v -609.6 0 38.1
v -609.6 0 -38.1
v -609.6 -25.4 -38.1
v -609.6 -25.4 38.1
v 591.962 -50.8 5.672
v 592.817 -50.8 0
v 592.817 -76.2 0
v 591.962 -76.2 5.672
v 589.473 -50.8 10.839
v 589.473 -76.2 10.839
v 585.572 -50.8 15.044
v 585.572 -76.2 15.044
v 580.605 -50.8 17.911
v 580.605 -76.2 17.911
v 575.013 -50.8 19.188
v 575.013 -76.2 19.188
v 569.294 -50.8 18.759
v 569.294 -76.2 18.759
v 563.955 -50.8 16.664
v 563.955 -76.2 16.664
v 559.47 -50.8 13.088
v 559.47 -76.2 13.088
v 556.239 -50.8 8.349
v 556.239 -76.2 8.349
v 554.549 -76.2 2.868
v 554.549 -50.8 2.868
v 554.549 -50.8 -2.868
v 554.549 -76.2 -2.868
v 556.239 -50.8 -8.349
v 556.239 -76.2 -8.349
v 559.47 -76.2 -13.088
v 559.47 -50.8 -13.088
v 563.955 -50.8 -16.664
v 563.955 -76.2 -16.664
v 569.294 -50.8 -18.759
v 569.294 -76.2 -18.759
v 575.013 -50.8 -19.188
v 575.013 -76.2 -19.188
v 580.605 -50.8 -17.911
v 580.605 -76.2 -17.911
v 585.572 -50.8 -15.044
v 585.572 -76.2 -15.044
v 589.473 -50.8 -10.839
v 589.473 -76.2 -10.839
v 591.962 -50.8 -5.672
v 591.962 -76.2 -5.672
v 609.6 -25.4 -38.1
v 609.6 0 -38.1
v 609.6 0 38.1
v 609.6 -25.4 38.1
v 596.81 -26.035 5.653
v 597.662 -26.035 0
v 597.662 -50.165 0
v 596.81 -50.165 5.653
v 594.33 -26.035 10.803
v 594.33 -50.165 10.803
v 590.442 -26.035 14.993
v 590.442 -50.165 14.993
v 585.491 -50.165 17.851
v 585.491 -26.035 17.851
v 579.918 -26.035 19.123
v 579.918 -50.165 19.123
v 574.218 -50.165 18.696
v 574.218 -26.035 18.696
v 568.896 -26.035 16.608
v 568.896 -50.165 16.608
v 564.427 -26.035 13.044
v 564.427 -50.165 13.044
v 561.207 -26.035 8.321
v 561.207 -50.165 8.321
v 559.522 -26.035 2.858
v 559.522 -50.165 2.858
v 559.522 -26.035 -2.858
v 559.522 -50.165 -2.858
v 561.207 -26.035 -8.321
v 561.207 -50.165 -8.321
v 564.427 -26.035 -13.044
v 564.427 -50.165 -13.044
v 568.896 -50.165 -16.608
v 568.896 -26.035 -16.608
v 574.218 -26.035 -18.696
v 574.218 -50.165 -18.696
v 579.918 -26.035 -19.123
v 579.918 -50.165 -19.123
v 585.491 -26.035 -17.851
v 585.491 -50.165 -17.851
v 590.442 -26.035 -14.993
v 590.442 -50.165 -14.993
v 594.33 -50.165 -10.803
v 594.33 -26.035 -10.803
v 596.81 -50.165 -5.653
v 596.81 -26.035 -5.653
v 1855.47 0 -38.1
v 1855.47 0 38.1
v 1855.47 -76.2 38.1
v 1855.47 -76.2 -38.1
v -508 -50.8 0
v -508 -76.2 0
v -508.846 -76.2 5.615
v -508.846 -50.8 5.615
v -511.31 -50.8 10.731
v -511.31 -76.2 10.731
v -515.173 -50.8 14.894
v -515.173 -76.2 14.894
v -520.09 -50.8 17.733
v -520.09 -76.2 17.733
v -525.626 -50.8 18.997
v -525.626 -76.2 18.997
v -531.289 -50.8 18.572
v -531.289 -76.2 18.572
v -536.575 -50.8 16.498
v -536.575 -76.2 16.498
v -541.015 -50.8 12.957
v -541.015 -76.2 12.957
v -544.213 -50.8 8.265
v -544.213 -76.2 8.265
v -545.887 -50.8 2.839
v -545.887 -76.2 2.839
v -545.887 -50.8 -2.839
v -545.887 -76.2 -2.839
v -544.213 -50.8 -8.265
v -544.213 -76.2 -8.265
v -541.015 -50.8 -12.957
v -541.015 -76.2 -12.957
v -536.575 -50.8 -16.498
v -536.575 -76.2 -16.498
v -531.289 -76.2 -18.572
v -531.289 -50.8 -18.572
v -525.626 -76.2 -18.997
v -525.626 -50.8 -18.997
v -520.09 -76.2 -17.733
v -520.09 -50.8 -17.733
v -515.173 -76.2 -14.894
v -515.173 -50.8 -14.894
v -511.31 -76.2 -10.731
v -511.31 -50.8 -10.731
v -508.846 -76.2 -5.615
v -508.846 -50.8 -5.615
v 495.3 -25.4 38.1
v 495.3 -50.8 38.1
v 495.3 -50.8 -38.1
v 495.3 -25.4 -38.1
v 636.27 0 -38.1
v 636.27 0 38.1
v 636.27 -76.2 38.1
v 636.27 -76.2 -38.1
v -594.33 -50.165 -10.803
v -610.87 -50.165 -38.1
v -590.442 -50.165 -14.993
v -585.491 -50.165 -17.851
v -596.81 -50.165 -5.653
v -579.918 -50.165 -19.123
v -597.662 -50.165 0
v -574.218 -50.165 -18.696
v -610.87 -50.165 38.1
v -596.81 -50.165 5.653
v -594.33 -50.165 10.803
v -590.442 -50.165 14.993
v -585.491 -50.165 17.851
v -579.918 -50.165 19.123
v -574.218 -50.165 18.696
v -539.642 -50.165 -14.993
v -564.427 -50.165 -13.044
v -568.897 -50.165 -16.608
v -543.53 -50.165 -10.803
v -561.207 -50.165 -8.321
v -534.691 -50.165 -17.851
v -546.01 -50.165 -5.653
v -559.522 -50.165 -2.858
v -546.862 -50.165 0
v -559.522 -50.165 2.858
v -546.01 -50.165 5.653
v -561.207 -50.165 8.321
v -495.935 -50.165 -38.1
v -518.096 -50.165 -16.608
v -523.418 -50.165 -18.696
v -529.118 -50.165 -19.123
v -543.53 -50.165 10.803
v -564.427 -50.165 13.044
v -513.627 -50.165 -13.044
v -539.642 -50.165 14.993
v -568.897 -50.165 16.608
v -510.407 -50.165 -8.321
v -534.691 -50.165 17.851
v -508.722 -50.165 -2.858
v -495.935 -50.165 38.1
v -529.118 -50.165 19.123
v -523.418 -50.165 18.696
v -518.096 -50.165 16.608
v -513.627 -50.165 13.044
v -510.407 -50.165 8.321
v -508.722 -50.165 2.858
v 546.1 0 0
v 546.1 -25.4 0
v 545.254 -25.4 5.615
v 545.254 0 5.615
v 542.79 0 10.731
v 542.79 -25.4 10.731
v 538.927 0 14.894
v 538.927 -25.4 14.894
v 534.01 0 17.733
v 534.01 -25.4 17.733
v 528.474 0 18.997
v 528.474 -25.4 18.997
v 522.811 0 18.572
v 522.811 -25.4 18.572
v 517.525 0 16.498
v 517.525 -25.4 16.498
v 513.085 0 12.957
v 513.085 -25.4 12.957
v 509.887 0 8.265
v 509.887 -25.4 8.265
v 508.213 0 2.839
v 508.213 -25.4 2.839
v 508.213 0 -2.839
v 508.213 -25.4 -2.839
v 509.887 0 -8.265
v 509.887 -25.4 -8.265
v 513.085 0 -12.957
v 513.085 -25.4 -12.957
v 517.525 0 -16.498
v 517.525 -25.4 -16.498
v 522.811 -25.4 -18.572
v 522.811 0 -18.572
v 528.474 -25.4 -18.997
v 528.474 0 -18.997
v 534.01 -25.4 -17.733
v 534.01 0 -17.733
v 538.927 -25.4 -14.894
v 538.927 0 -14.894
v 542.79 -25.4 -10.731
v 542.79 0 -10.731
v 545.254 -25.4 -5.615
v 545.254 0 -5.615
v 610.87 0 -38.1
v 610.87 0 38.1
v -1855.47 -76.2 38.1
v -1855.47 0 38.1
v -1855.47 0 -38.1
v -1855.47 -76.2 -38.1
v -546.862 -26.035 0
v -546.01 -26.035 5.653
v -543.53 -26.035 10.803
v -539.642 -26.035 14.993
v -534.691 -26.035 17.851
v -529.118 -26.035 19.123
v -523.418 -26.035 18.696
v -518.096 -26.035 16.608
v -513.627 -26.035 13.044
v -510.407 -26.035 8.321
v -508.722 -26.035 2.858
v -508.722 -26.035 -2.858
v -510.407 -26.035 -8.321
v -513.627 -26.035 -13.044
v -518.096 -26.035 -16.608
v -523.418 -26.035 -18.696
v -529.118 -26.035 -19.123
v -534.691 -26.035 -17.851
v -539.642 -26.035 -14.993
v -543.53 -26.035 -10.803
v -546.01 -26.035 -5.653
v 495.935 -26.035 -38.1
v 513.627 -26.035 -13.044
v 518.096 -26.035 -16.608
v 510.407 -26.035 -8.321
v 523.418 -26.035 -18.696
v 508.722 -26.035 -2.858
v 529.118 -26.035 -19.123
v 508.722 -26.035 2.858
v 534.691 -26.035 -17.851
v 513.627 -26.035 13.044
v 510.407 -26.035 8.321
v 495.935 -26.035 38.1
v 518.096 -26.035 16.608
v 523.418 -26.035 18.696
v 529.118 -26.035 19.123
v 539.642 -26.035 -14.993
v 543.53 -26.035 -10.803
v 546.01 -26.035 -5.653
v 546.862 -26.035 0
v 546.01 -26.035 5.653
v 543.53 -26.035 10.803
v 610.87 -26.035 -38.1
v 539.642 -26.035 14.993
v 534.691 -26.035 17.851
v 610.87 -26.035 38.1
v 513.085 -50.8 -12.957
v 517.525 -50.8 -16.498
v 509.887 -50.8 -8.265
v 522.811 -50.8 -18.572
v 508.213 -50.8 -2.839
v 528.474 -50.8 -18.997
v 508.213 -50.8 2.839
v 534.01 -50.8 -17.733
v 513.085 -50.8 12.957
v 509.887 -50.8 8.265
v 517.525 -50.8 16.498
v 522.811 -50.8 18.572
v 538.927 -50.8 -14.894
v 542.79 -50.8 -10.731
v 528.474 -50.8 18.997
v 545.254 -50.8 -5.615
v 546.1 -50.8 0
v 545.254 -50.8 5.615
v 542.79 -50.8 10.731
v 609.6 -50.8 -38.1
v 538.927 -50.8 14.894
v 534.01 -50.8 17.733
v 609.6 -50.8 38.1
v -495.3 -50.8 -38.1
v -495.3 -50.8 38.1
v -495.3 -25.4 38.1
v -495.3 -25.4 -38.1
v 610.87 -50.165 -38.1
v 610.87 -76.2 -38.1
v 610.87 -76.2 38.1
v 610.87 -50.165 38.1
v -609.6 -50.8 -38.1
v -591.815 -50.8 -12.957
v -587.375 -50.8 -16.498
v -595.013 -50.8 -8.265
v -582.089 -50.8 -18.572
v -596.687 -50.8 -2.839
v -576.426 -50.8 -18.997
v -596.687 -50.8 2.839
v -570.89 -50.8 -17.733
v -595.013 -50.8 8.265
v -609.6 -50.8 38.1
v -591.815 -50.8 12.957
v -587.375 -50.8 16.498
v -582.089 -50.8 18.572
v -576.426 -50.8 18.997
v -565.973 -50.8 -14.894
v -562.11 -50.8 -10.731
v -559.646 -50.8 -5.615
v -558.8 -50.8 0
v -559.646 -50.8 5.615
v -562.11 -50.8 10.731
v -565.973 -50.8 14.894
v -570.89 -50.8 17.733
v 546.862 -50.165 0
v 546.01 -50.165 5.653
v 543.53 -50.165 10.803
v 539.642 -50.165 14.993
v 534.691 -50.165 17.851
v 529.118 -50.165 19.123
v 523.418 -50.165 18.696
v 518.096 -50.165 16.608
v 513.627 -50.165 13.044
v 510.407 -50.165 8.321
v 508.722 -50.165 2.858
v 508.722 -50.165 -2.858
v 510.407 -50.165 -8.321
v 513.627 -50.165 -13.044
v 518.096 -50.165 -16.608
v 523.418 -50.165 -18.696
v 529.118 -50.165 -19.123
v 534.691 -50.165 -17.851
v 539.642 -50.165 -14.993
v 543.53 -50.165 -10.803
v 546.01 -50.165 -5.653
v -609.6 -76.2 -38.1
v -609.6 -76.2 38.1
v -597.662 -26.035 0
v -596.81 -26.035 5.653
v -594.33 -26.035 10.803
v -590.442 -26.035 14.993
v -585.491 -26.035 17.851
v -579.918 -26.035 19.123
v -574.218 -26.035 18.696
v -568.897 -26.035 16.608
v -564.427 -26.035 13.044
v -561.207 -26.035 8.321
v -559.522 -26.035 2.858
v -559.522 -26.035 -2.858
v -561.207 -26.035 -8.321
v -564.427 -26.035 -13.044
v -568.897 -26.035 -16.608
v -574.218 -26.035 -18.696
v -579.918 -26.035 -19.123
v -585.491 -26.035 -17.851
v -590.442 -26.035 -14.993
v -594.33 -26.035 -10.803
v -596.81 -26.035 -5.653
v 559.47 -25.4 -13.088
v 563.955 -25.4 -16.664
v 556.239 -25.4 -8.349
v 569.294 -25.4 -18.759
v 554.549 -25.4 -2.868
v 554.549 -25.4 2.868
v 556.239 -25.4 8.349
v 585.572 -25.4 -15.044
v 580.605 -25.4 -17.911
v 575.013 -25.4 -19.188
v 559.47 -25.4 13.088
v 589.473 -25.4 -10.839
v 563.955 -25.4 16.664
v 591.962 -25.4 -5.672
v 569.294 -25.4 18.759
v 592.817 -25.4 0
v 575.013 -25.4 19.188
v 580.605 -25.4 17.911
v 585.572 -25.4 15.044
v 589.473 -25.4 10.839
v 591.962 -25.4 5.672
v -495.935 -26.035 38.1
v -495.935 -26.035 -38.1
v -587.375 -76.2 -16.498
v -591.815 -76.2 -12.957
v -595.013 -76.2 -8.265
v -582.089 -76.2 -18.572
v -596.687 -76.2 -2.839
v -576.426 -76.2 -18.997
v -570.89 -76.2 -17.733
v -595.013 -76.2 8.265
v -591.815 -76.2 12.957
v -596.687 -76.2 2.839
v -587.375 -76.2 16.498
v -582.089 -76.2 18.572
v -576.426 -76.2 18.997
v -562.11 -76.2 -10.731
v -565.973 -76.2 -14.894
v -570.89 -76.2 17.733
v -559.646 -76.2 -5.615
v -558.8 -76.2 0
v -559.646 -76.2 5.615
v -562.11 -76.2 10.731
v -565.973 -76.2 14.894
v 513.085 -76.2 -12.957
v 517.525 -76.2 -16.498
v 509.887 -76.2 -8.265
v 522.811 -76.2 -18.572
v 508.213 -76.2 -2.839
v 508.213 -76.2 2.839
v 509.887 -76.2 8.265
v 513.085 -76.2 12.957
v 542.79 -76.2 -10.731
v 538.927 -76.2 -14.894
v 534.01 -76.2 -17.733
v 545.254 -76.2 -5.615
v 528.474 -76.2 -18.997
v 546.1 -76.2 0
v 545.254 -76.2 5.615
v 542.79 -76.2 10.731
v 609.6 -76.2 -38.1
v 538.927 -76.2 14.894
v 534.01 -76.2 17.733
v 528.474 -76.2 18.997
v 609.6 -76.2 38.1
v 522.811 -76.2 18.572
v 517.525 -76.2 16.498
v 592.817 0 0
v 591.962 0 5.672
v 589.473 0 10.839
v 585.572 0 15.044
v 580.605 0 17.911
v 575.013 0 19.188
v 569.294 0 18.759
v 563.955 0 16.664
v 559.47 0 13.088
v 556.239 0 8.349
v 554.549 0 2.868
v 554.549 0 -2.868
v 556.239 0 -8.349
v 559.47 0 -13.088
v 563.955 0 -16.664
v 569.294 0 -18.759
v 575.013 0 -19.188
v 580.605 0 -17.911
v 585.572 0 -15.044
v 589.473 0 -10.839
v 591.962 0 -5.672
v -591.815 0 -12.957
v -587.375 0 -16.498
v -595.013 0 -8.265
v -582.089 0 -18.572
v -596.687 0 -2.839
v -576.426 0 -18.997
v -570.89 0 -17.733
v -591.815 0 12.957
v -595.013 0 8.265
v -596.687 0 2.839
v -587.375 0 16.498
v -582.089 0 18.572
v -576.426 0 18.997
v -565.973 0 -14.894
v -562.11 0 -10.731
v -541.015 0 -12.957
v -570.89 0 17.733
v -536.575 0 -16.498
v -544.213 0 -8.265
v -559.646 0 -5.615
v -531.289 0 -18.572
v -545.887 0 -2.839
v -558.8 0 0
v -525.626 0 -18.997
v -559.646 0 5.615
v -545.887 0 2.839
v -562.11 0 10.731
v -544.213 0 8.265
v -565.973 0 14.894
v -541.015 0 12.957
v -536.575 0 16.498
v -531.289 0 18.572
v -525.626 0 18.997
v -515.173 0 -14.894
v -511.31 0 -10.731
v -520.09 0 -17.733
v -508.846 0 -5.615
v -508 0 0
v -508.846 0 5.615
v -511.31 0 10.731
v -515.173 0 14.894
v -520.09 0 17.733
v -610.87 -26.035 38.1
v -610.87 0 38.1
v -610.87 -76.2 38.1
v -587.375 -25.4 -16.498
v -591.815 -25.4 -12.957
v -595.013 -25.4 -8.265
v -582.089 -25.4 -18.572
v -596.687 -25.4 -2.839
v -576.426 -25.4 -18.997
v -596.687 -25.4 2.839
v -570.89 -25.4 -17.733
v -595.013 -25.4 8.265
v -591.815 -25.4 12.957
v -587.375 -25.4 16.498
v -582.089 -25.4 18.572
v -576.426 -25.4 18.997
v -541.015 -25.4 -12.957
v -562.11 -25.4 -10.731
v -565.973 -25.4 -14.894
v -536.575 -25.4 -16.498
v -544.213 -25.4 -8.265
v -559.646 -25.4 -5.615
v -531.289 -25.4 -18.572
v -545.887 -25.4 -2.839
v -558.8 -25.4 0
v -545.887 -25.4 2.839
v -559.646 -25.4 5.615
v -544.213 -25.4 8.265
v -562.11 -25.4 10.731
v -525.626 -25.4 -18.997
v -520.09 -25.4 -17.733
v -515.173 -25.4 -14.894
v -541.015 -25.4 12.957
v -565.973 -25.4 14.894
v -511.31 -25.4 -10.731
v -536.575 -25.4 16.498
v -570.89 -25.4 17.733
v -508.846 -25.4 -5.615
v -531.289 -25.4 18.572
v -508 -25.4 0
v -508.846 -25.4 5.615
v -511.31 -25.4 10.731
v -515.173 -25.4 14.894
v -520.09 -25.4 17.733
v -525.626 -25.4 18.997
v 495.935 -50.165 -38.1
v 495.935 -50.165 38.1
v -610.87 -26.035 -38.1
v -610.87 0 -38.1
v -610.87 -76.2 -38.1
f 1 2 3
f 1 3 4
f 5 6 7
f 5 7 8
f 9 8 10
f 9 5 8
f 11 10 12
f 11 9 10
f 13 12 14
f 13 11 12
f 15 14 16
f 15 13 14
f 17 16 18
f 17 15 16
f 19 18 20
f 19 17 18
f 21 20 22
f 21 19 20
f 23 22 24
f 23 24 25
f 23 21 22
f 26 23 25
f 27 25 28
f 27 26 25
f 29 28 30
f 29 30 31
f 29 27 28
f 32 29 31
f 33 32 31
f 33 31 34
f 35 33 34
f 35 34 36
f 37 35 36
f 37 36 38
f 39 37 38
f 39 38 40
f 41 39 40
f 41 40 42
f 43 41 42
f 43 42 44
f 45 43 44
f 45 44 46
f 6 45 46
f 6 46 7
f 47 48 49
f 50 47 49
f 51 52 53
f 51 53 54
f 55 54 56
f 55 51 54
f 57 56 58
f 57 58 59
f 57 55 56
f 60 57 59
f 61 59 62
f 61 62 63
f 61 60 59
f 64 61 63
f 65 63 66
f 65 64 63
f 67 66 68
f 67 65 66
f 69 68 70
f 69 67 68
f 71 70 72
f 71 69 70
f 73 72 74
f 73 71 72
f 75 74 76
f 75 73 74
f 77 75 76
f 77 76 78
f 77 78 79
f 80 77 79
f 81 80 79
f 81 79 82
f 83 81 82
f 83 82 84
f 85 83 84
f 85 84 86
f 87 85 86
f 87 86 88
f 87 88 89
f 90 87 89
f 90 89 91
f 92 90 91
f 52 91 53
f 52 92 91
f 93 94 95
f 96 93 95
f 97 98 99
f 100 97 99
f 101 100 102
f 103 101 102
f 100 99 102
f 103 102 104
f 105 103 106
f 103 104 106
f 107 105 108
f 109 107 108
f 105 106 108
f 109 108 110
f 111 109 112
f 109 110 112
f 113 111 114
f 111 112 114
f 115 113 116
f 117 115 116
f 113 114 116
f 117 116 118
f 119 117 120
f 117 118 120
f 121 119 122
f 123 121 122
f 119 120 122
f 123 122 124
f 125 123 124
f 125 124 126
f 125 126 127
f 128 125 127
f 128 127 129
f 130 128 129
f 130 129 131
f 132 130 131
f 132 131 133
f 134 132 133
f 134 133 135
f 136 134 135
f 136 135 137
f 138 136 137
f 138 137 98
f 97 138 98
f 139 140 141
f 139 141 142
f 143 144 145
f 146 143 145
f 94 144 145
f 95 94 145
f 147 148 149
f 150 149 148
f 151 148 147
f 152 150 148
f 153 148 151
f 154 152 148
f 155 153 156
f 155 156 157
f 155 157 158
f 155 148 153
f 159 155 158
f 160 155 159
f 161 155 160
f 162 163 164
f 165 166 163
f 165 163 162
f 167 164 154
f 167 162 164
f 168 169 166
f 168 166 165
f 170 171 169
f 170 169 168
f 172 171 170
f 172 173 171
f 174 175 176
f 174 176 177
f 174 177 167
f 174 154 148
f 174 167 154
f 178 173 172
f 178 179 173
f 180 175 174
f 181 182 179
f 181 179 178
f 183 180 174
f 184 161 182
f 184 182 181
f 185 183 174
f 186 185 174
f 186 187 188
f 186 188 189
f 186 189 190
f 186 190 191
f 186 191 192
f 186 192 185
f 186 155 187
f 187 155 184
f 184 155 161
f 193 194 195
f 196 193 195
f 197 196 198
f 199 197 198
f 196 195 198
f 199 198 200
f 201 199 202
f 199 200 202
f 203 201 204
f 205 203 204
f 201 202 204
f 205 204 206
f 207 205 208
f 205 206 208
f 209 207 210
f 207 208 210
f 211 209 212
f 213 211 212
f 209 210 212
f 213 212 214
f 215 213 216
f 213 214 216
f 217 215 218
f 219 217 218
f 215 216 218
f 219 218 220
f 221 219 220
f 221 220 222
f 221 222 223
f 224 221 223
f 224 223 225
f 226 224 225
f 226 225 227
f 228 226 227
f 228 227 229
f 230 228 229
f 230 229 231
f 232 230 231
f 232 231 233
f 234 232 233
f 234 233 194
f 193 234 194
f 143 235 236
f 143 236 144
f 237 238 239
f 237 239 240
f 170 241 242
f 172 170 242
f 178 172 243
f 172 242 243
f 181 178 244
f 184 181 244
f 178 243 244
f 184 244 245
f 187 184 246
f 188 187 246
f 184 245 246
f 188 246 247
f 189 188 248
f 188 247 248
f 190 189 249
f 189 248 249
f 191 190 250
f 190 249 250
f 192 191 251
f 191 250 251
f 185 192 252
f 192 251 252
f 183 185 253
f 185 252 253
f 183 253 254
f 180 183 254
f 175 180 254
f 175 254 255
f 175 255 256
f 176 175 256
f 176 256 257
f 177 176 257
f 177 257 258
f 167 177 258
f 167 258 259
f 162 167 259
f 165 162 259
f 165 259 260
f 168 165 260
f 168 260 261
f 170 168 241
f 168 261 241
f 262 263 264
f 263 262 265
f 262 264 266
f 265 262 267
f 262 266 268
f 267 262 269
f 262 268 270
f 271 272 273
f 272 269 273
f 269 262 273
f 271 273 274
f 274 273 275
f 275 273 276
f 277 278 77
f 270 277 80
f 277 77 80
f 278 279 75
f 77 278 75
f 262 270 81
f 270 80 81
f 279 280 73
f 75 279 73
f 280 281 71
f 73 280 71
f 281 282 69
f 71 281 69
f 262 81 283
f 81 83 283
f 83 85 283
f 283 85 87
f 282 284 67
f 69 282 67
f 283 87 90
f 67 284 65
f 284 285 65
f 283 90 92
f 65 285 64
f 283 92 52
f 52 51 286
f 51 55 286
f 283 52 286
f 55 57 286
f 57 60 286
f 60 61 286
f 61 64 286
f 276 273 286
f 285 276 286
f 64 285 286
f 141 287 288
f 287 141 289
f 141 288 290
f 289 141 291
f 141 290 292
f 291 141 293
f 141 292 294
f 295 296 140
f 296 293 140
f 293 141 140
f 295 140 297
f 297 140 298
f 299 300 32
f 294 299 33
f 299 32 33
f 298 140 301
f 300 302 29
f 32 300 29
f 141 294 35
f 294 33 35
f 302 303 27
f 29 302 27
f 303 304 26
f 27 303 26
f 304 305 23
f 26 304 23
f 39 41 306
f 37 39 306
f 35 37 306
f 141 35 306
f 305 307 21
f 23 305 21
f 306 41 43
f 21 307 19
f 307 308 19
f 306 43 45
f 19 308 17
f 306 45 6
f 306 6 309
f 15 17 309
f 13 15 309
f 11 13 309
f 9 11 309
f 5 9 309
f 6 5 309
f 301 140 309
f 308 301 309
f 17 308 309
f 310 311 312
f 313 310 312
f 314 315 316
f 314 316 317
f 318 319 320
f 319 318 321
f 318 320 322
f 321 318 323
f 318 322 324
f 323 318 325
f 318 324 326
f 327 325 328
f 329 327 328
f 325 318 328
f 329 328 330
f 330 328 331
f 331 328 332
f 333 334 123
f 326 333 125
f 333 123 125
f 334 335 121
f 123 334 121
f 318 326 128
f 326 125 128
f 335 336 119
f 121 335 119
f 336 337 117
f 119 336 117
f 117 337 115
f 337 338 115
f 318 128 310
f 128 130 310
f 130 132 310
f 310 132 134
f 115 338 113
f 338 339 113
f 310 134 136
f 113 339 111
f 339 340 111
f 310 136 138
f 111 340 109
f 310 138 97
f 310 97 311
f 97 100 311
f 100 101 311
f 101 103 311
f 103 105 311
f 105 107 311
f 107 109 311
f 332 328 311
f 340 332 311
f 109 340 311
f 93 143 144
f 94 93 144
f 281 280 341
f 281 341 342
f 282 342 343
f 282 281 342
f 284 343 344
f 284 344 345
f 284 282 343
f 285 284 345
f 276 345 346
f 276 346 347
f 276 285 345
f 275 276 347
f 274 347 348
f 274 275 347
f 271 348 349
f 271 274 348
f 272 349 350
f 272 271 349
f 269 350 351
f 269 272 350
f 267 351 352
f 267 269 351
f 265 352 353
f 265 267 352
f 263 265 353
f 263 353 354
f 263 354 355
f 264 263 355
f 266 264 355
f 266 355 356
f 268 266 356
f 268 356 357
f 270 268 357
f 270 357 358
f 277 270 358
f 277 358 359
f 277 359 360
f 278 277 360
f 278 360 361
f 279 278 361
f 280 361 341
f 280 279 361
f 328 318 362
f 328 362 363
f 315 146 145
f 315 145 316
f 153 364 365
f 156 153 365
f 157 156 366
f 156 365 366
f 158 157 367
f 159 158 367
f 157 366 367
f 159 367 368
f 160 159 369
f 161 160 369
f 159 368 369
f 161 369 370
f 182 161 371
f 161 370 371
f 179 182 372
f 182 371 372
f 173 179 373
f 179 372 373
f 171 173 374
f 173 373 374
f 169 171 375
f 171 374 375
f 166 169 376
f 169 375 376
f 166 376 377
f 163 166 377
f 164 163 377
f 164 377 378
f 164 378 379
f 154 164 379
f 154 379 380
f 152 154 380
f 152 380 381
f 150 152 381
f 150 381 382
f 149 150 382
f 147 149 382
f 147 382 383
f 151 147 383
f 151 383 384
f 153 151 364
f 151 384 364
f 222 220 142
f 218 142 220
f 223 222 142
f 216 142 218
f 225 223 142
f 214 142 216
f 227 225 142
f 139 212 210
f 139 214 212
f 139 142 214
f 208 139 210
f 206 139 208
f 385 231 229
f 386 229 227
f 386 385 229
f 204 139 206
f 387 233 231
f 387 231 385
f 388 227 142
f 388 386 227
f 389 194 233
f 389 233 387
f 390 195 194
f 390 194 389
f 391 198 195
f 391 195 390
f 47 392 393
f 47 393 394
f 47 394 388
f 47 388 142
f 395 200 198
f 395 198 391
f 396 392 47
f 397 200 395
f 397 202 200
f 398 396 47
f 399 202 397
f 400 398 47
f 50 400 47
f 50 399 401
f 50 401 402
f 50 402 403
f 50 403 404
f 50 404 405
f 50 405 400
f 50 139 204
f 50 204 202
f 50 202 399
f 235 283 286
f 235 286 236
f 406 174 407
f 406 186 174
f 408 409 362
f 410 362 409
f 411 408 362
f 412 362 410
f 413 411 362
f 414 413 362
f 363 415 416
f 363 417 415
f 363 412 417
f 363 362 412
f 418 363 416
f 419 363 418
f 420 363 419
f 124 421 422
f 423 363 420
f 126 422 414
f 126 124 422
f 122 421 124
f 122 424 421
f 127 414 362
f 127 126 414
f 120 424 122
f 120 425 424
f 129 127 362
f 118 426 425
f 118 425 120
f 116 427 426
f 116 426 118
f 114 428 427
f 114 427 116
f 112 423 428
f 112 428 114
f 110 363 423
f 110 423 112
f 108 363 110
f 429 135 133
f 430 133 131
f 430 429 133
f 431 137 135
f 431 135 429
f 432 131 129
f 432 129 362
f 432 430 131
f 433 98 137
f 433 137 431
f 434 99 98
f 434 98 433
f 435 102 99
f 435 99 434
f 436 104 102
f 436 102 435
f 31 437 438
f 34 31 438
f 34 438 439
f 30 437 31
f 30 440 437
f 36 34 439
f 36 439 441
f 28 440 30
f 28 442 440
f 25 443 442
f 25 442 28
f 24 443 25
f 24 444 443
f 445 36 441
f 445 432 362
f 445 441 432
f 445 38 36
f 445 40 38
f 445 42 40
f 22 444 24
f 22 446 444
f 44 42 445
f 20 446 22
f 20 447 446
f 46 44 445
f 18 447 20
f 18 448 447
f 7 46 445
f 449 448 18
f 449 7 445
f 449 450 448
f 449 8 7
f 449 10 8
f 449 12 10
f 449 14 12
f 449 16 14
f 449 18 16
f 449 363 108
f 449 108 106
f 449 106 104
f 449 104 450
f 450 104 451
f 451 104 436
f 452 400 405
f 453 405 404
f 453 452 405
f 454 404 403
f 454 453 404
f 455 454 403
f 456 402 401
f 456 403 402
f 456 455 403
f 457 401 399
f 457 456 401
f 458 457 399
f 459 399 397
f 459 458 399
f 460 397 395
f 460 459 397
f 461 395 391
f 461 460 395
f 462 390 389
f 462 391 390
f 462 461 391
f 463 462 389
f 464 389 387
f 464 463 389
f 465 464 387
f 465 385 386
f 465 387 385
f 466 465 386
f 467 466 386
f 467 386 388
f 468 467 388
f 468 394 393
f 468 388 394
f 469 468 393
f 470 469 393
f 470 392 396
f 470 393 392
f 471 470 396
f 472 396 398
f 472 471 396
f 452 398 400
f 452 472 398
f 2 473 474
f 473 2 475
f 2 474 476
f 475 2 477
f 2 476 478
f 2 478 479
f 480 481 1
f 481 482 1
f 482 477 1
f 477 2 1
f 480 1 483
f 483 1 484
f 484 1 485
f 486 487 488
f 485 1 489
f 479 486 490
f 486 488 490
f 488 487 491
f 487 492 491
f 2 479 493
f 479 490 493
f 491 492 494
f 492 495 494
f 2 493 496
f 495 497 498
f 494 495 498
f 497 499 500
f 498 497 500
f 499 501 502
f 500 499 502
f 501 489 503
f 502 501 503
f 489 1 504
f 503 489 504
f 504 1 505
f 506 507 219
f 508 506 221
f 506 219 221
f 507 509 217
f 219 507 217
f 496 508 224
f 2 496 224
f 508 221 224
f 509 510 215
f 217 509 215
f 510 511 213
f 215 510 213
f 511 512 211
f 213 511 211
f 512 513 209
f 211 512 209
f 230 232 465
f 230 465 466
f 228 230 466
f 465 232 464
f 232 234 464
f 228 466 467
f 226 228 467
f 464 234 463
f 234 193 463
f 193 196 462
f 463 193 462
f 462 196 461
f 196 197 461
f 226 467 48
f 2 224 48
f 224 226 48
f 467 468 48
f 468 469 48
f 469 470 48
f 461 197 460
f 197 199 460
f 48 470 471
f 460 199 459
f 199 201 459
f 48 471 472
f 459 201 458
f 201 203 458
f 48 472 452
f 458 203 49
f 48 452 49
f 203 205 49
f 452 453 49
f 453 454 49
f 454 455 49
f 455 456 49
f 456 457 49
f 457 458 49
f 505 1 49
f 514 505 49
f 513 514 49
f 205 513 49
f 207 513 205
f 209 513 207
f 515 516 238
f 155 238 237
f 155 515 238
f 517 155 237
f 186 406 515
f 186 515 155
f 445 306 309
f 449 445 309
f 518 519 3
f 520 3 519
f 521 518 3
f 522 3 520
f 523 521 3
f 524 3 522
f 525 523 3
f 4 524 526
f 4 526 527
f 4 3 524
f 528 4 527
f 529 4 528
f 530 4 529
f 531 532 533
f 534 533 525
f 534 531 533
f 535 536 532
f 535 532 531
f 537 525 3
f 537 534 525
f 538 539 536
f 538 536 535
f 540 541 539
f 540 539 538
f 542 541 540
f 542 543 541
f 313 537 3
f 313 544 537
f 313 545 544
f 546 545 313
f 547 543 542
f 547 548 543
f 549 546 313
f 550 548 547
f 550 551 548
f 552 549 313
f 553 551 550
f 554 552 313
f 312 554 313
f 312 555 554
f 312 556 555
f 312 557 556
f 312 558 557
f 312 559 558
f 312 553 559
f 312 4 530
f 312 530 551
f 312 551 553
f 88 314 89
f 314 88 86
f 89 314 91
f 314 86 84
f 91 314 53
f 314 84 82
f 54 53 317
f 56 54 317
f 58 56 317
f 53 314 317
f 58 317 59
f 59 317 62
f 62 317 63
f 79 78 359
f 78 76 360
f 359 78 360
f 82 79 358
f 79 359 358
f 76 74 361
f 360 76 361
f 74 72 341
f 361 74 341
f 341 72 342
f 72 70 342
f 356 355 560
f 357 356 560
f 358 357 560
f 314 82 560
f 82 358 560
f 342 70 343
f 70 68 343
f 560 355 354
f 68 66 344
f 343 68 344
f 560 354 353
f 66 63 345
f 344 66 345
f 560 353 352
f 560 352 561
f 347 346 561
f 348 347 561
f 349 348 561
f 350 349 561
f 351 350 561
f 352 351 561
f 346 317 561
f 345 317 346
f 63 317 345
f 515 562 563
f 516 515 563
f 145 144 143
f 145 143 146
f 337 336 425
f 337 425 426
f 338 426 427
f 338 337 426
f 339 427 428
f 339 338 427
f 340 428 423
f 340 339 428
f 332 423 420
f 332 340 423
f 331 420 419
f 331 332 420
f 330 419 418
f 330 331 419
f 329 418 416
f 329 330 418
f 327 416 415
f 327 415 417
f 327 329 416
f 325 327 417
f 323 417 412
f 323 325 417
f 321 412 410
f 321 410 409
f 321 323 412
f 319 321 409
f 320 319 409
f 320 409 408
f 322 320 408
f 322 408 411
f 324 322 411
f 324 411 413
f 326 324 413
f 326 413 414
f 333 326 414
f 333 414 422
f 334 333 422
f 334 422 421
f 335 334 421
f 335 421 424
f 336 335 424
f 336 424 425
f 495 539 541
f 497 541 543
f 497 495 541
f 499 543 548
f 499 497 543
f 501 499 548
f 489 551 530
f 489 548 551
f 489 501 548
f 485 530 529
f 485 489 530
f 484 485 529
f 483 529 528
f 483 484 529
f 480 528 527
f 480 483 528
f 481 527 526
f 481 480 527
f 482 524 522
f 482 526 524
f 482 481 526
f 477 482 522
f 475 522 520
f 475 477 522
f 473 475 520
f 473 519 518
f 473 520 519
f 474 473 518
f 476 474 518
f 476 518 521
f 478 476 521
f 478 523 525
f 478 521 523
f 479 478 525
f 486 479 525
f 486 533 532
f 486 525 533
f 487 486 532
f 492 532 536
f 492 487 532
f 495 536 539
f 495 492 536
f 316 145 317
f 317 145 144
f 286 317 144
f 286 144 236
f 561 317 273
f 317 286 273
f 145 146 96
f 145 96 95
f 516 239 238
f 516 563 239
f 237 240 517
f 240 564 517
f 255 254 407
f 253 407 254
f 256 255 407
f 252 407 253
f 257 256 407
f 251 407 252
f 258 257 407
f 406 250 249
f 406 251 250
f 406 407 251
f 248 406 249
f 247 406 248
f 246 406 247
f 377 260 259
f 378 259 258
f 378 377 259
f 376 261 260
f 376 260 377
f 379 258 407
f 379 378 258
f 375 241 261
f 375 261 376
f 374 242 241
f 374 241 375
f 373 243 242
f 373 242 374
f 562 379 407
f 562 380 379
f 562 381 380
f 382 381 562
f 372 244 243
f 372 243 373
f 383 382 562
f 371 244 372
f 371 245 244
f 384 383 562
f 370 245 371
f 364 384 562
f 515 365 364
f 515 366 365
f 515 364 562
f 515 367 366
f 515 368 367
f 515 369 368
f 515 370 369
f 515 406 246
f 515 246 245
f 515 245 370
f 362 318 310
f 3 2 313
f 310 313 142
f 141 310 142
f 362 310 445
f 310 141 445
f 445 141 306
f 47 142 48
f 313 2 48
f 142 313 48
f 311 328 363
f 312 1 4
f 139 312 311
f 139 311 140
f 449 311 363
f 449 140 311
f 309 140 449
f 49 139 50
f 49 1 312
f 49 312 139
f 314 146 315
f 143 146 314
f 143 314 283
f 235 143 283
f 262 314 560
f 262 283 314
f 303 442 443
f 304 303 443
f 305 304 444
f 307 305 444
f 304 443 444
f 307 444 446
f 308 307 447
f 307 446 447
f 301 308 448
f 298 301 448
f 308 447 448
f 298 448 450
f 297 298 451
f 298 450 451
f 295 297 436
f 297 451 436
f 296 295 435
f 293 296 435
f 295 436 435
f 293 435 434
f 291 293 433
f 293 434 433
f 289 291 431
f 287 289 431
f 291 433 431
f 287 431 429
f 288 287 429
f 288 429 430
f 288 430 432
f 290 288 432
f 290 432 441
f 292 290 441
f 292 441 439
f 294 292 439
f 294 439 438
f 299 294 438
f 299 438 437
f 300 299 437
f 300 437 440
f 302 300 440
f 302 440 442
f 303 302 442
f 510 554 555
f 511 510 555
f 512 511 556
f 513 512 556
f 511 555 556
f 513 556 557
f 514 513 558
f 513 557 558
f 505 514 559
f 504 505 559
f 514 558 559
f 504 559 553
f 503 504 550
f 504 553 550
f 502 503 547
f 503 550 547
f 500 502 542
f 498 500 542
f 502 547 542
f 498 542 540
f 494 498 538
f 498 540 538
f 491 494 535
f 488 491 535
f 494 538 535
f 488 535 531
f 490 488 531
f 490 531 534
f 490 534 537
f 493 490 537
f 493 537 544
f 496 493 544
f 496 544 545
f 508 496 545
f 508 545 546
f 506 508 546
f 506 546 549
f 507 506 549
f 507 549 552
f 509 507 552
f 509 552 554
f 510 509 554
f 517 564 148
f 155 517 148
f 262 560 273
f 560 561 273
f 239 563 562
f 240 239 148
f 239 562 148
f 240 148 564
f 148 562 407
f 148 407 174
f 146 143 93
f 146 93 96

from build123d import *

# Parameters (mm, degrees)
F0_W      = 1219.2
F0_H      = 76.2
F0_R      = 19.05
F0_R_2    = 19.2415592486
F1_DEPTH  = 76.2
F2_W      = 114.3
F2_H      = 25.4
F3_DEPTH  = 76.2
F4_W      = 114.3
F4_H      = 25.4
F5_DEPTH  = 76.2
F6_R      = 19.05
F7_DEPTH  = 76.2
F9_DEPTH  = 38.1
F10_R     = 19.177
F11_DEPTH = 24.13
F13_DEPTH = 1219.2


with BuildPart() as f1:
    # F0 (on Front) → F1 (new body)
    with BuildSketch(Plane.XZ):
        Rectangle(F0_W, F0_H)
        with Locations((-577.85, 0)):
            Circle(F0_R, mode=Mode.SUBTRACT)
        with Locations((573.5753178596, 0)):
            Circle(F0_R_2, mode=Mode.SUBTRACT)
    extrude(amount=F1_DEPTH)

    # F2 (on face) → F3 (cut)
    with BuildSketch(Plane.XY.offset(38.1)):
        with Locations((-552.45, -38.1)):
            Rectangle(F2_W, F2_H)
    extrude(amount=-F3_DEPTH, mode=Mode.SUBTRACT)

    # F4 (on face) → F5 (cut)
    with BuildSketch(Plane.XY.offset(38.1)):
        with Locations((552.45, -38.1)):
            Rectangle(F4_W, F4_H)
    extrude(amount=-F5_DEPTH, mode=Mode.SUBTRACT)

    # F6 (on face) → F7 (cut)
    with BuildSketch(Plane.XZ.offset(76.2)):
        with Locations((-527.05, 0)):
            Circle(F6_R)
        with Locations((527.05, 0)):
            Circle(F6_R)
    extrude(amount=-F7_DEPTH, mode=Mode.SUBTRACT)


with BuildPart() as f9:
    # F8 (on Top) → F9 (new body, symmetric)
    with BuildSketch(Plane.XY):
        Polygon((-495.935, -50.165), (-495.935, -26.035), (-610.87, -26.035), (-610.87, 0), (-636.27, 0), (-636.27, -76.2), (-610.87, -76.2), (-610.87, -50.165), align=None)
    extrude(amount=F9_DEPTH, both=True)

    # F10 (on face) → F11 (cut, through all)
    with BuildSketch(Plane(origin=(0, -26.035, 0), x_dir=(-1, 0, 0), z_dir=(0, 1, 0))):
        with Locations((578.485, 0)):
            Circle(F10_R)
        with Locations((527.685, 0)):
            Circle(F10_R)
    extrude(amount=-F11_DEPTH, mode=Mode.SUBTRACT)


with BuildPart() as f12_1:
    # F12: instance of F9
    add(f9.part.mirror(Plane.YZ))


with BuildPart() as f13:
    # F13 (new): a face of the model
    f13_faces = [f12_1.part.faces().sort_by_distance(p)[0] for p in [
        (636.27, -38.1, 0),
    ]]
    extrude(f13_faces, amount=F13_DEPTH)


with BuildPart() as f9_1:
    add(f9.part)

    # F14: F13 across plane
    add(f13.part.mirror(Plane.YZ))


solid = Compound([f1.part, f12_1.part, f13.part, f9_1.part])
